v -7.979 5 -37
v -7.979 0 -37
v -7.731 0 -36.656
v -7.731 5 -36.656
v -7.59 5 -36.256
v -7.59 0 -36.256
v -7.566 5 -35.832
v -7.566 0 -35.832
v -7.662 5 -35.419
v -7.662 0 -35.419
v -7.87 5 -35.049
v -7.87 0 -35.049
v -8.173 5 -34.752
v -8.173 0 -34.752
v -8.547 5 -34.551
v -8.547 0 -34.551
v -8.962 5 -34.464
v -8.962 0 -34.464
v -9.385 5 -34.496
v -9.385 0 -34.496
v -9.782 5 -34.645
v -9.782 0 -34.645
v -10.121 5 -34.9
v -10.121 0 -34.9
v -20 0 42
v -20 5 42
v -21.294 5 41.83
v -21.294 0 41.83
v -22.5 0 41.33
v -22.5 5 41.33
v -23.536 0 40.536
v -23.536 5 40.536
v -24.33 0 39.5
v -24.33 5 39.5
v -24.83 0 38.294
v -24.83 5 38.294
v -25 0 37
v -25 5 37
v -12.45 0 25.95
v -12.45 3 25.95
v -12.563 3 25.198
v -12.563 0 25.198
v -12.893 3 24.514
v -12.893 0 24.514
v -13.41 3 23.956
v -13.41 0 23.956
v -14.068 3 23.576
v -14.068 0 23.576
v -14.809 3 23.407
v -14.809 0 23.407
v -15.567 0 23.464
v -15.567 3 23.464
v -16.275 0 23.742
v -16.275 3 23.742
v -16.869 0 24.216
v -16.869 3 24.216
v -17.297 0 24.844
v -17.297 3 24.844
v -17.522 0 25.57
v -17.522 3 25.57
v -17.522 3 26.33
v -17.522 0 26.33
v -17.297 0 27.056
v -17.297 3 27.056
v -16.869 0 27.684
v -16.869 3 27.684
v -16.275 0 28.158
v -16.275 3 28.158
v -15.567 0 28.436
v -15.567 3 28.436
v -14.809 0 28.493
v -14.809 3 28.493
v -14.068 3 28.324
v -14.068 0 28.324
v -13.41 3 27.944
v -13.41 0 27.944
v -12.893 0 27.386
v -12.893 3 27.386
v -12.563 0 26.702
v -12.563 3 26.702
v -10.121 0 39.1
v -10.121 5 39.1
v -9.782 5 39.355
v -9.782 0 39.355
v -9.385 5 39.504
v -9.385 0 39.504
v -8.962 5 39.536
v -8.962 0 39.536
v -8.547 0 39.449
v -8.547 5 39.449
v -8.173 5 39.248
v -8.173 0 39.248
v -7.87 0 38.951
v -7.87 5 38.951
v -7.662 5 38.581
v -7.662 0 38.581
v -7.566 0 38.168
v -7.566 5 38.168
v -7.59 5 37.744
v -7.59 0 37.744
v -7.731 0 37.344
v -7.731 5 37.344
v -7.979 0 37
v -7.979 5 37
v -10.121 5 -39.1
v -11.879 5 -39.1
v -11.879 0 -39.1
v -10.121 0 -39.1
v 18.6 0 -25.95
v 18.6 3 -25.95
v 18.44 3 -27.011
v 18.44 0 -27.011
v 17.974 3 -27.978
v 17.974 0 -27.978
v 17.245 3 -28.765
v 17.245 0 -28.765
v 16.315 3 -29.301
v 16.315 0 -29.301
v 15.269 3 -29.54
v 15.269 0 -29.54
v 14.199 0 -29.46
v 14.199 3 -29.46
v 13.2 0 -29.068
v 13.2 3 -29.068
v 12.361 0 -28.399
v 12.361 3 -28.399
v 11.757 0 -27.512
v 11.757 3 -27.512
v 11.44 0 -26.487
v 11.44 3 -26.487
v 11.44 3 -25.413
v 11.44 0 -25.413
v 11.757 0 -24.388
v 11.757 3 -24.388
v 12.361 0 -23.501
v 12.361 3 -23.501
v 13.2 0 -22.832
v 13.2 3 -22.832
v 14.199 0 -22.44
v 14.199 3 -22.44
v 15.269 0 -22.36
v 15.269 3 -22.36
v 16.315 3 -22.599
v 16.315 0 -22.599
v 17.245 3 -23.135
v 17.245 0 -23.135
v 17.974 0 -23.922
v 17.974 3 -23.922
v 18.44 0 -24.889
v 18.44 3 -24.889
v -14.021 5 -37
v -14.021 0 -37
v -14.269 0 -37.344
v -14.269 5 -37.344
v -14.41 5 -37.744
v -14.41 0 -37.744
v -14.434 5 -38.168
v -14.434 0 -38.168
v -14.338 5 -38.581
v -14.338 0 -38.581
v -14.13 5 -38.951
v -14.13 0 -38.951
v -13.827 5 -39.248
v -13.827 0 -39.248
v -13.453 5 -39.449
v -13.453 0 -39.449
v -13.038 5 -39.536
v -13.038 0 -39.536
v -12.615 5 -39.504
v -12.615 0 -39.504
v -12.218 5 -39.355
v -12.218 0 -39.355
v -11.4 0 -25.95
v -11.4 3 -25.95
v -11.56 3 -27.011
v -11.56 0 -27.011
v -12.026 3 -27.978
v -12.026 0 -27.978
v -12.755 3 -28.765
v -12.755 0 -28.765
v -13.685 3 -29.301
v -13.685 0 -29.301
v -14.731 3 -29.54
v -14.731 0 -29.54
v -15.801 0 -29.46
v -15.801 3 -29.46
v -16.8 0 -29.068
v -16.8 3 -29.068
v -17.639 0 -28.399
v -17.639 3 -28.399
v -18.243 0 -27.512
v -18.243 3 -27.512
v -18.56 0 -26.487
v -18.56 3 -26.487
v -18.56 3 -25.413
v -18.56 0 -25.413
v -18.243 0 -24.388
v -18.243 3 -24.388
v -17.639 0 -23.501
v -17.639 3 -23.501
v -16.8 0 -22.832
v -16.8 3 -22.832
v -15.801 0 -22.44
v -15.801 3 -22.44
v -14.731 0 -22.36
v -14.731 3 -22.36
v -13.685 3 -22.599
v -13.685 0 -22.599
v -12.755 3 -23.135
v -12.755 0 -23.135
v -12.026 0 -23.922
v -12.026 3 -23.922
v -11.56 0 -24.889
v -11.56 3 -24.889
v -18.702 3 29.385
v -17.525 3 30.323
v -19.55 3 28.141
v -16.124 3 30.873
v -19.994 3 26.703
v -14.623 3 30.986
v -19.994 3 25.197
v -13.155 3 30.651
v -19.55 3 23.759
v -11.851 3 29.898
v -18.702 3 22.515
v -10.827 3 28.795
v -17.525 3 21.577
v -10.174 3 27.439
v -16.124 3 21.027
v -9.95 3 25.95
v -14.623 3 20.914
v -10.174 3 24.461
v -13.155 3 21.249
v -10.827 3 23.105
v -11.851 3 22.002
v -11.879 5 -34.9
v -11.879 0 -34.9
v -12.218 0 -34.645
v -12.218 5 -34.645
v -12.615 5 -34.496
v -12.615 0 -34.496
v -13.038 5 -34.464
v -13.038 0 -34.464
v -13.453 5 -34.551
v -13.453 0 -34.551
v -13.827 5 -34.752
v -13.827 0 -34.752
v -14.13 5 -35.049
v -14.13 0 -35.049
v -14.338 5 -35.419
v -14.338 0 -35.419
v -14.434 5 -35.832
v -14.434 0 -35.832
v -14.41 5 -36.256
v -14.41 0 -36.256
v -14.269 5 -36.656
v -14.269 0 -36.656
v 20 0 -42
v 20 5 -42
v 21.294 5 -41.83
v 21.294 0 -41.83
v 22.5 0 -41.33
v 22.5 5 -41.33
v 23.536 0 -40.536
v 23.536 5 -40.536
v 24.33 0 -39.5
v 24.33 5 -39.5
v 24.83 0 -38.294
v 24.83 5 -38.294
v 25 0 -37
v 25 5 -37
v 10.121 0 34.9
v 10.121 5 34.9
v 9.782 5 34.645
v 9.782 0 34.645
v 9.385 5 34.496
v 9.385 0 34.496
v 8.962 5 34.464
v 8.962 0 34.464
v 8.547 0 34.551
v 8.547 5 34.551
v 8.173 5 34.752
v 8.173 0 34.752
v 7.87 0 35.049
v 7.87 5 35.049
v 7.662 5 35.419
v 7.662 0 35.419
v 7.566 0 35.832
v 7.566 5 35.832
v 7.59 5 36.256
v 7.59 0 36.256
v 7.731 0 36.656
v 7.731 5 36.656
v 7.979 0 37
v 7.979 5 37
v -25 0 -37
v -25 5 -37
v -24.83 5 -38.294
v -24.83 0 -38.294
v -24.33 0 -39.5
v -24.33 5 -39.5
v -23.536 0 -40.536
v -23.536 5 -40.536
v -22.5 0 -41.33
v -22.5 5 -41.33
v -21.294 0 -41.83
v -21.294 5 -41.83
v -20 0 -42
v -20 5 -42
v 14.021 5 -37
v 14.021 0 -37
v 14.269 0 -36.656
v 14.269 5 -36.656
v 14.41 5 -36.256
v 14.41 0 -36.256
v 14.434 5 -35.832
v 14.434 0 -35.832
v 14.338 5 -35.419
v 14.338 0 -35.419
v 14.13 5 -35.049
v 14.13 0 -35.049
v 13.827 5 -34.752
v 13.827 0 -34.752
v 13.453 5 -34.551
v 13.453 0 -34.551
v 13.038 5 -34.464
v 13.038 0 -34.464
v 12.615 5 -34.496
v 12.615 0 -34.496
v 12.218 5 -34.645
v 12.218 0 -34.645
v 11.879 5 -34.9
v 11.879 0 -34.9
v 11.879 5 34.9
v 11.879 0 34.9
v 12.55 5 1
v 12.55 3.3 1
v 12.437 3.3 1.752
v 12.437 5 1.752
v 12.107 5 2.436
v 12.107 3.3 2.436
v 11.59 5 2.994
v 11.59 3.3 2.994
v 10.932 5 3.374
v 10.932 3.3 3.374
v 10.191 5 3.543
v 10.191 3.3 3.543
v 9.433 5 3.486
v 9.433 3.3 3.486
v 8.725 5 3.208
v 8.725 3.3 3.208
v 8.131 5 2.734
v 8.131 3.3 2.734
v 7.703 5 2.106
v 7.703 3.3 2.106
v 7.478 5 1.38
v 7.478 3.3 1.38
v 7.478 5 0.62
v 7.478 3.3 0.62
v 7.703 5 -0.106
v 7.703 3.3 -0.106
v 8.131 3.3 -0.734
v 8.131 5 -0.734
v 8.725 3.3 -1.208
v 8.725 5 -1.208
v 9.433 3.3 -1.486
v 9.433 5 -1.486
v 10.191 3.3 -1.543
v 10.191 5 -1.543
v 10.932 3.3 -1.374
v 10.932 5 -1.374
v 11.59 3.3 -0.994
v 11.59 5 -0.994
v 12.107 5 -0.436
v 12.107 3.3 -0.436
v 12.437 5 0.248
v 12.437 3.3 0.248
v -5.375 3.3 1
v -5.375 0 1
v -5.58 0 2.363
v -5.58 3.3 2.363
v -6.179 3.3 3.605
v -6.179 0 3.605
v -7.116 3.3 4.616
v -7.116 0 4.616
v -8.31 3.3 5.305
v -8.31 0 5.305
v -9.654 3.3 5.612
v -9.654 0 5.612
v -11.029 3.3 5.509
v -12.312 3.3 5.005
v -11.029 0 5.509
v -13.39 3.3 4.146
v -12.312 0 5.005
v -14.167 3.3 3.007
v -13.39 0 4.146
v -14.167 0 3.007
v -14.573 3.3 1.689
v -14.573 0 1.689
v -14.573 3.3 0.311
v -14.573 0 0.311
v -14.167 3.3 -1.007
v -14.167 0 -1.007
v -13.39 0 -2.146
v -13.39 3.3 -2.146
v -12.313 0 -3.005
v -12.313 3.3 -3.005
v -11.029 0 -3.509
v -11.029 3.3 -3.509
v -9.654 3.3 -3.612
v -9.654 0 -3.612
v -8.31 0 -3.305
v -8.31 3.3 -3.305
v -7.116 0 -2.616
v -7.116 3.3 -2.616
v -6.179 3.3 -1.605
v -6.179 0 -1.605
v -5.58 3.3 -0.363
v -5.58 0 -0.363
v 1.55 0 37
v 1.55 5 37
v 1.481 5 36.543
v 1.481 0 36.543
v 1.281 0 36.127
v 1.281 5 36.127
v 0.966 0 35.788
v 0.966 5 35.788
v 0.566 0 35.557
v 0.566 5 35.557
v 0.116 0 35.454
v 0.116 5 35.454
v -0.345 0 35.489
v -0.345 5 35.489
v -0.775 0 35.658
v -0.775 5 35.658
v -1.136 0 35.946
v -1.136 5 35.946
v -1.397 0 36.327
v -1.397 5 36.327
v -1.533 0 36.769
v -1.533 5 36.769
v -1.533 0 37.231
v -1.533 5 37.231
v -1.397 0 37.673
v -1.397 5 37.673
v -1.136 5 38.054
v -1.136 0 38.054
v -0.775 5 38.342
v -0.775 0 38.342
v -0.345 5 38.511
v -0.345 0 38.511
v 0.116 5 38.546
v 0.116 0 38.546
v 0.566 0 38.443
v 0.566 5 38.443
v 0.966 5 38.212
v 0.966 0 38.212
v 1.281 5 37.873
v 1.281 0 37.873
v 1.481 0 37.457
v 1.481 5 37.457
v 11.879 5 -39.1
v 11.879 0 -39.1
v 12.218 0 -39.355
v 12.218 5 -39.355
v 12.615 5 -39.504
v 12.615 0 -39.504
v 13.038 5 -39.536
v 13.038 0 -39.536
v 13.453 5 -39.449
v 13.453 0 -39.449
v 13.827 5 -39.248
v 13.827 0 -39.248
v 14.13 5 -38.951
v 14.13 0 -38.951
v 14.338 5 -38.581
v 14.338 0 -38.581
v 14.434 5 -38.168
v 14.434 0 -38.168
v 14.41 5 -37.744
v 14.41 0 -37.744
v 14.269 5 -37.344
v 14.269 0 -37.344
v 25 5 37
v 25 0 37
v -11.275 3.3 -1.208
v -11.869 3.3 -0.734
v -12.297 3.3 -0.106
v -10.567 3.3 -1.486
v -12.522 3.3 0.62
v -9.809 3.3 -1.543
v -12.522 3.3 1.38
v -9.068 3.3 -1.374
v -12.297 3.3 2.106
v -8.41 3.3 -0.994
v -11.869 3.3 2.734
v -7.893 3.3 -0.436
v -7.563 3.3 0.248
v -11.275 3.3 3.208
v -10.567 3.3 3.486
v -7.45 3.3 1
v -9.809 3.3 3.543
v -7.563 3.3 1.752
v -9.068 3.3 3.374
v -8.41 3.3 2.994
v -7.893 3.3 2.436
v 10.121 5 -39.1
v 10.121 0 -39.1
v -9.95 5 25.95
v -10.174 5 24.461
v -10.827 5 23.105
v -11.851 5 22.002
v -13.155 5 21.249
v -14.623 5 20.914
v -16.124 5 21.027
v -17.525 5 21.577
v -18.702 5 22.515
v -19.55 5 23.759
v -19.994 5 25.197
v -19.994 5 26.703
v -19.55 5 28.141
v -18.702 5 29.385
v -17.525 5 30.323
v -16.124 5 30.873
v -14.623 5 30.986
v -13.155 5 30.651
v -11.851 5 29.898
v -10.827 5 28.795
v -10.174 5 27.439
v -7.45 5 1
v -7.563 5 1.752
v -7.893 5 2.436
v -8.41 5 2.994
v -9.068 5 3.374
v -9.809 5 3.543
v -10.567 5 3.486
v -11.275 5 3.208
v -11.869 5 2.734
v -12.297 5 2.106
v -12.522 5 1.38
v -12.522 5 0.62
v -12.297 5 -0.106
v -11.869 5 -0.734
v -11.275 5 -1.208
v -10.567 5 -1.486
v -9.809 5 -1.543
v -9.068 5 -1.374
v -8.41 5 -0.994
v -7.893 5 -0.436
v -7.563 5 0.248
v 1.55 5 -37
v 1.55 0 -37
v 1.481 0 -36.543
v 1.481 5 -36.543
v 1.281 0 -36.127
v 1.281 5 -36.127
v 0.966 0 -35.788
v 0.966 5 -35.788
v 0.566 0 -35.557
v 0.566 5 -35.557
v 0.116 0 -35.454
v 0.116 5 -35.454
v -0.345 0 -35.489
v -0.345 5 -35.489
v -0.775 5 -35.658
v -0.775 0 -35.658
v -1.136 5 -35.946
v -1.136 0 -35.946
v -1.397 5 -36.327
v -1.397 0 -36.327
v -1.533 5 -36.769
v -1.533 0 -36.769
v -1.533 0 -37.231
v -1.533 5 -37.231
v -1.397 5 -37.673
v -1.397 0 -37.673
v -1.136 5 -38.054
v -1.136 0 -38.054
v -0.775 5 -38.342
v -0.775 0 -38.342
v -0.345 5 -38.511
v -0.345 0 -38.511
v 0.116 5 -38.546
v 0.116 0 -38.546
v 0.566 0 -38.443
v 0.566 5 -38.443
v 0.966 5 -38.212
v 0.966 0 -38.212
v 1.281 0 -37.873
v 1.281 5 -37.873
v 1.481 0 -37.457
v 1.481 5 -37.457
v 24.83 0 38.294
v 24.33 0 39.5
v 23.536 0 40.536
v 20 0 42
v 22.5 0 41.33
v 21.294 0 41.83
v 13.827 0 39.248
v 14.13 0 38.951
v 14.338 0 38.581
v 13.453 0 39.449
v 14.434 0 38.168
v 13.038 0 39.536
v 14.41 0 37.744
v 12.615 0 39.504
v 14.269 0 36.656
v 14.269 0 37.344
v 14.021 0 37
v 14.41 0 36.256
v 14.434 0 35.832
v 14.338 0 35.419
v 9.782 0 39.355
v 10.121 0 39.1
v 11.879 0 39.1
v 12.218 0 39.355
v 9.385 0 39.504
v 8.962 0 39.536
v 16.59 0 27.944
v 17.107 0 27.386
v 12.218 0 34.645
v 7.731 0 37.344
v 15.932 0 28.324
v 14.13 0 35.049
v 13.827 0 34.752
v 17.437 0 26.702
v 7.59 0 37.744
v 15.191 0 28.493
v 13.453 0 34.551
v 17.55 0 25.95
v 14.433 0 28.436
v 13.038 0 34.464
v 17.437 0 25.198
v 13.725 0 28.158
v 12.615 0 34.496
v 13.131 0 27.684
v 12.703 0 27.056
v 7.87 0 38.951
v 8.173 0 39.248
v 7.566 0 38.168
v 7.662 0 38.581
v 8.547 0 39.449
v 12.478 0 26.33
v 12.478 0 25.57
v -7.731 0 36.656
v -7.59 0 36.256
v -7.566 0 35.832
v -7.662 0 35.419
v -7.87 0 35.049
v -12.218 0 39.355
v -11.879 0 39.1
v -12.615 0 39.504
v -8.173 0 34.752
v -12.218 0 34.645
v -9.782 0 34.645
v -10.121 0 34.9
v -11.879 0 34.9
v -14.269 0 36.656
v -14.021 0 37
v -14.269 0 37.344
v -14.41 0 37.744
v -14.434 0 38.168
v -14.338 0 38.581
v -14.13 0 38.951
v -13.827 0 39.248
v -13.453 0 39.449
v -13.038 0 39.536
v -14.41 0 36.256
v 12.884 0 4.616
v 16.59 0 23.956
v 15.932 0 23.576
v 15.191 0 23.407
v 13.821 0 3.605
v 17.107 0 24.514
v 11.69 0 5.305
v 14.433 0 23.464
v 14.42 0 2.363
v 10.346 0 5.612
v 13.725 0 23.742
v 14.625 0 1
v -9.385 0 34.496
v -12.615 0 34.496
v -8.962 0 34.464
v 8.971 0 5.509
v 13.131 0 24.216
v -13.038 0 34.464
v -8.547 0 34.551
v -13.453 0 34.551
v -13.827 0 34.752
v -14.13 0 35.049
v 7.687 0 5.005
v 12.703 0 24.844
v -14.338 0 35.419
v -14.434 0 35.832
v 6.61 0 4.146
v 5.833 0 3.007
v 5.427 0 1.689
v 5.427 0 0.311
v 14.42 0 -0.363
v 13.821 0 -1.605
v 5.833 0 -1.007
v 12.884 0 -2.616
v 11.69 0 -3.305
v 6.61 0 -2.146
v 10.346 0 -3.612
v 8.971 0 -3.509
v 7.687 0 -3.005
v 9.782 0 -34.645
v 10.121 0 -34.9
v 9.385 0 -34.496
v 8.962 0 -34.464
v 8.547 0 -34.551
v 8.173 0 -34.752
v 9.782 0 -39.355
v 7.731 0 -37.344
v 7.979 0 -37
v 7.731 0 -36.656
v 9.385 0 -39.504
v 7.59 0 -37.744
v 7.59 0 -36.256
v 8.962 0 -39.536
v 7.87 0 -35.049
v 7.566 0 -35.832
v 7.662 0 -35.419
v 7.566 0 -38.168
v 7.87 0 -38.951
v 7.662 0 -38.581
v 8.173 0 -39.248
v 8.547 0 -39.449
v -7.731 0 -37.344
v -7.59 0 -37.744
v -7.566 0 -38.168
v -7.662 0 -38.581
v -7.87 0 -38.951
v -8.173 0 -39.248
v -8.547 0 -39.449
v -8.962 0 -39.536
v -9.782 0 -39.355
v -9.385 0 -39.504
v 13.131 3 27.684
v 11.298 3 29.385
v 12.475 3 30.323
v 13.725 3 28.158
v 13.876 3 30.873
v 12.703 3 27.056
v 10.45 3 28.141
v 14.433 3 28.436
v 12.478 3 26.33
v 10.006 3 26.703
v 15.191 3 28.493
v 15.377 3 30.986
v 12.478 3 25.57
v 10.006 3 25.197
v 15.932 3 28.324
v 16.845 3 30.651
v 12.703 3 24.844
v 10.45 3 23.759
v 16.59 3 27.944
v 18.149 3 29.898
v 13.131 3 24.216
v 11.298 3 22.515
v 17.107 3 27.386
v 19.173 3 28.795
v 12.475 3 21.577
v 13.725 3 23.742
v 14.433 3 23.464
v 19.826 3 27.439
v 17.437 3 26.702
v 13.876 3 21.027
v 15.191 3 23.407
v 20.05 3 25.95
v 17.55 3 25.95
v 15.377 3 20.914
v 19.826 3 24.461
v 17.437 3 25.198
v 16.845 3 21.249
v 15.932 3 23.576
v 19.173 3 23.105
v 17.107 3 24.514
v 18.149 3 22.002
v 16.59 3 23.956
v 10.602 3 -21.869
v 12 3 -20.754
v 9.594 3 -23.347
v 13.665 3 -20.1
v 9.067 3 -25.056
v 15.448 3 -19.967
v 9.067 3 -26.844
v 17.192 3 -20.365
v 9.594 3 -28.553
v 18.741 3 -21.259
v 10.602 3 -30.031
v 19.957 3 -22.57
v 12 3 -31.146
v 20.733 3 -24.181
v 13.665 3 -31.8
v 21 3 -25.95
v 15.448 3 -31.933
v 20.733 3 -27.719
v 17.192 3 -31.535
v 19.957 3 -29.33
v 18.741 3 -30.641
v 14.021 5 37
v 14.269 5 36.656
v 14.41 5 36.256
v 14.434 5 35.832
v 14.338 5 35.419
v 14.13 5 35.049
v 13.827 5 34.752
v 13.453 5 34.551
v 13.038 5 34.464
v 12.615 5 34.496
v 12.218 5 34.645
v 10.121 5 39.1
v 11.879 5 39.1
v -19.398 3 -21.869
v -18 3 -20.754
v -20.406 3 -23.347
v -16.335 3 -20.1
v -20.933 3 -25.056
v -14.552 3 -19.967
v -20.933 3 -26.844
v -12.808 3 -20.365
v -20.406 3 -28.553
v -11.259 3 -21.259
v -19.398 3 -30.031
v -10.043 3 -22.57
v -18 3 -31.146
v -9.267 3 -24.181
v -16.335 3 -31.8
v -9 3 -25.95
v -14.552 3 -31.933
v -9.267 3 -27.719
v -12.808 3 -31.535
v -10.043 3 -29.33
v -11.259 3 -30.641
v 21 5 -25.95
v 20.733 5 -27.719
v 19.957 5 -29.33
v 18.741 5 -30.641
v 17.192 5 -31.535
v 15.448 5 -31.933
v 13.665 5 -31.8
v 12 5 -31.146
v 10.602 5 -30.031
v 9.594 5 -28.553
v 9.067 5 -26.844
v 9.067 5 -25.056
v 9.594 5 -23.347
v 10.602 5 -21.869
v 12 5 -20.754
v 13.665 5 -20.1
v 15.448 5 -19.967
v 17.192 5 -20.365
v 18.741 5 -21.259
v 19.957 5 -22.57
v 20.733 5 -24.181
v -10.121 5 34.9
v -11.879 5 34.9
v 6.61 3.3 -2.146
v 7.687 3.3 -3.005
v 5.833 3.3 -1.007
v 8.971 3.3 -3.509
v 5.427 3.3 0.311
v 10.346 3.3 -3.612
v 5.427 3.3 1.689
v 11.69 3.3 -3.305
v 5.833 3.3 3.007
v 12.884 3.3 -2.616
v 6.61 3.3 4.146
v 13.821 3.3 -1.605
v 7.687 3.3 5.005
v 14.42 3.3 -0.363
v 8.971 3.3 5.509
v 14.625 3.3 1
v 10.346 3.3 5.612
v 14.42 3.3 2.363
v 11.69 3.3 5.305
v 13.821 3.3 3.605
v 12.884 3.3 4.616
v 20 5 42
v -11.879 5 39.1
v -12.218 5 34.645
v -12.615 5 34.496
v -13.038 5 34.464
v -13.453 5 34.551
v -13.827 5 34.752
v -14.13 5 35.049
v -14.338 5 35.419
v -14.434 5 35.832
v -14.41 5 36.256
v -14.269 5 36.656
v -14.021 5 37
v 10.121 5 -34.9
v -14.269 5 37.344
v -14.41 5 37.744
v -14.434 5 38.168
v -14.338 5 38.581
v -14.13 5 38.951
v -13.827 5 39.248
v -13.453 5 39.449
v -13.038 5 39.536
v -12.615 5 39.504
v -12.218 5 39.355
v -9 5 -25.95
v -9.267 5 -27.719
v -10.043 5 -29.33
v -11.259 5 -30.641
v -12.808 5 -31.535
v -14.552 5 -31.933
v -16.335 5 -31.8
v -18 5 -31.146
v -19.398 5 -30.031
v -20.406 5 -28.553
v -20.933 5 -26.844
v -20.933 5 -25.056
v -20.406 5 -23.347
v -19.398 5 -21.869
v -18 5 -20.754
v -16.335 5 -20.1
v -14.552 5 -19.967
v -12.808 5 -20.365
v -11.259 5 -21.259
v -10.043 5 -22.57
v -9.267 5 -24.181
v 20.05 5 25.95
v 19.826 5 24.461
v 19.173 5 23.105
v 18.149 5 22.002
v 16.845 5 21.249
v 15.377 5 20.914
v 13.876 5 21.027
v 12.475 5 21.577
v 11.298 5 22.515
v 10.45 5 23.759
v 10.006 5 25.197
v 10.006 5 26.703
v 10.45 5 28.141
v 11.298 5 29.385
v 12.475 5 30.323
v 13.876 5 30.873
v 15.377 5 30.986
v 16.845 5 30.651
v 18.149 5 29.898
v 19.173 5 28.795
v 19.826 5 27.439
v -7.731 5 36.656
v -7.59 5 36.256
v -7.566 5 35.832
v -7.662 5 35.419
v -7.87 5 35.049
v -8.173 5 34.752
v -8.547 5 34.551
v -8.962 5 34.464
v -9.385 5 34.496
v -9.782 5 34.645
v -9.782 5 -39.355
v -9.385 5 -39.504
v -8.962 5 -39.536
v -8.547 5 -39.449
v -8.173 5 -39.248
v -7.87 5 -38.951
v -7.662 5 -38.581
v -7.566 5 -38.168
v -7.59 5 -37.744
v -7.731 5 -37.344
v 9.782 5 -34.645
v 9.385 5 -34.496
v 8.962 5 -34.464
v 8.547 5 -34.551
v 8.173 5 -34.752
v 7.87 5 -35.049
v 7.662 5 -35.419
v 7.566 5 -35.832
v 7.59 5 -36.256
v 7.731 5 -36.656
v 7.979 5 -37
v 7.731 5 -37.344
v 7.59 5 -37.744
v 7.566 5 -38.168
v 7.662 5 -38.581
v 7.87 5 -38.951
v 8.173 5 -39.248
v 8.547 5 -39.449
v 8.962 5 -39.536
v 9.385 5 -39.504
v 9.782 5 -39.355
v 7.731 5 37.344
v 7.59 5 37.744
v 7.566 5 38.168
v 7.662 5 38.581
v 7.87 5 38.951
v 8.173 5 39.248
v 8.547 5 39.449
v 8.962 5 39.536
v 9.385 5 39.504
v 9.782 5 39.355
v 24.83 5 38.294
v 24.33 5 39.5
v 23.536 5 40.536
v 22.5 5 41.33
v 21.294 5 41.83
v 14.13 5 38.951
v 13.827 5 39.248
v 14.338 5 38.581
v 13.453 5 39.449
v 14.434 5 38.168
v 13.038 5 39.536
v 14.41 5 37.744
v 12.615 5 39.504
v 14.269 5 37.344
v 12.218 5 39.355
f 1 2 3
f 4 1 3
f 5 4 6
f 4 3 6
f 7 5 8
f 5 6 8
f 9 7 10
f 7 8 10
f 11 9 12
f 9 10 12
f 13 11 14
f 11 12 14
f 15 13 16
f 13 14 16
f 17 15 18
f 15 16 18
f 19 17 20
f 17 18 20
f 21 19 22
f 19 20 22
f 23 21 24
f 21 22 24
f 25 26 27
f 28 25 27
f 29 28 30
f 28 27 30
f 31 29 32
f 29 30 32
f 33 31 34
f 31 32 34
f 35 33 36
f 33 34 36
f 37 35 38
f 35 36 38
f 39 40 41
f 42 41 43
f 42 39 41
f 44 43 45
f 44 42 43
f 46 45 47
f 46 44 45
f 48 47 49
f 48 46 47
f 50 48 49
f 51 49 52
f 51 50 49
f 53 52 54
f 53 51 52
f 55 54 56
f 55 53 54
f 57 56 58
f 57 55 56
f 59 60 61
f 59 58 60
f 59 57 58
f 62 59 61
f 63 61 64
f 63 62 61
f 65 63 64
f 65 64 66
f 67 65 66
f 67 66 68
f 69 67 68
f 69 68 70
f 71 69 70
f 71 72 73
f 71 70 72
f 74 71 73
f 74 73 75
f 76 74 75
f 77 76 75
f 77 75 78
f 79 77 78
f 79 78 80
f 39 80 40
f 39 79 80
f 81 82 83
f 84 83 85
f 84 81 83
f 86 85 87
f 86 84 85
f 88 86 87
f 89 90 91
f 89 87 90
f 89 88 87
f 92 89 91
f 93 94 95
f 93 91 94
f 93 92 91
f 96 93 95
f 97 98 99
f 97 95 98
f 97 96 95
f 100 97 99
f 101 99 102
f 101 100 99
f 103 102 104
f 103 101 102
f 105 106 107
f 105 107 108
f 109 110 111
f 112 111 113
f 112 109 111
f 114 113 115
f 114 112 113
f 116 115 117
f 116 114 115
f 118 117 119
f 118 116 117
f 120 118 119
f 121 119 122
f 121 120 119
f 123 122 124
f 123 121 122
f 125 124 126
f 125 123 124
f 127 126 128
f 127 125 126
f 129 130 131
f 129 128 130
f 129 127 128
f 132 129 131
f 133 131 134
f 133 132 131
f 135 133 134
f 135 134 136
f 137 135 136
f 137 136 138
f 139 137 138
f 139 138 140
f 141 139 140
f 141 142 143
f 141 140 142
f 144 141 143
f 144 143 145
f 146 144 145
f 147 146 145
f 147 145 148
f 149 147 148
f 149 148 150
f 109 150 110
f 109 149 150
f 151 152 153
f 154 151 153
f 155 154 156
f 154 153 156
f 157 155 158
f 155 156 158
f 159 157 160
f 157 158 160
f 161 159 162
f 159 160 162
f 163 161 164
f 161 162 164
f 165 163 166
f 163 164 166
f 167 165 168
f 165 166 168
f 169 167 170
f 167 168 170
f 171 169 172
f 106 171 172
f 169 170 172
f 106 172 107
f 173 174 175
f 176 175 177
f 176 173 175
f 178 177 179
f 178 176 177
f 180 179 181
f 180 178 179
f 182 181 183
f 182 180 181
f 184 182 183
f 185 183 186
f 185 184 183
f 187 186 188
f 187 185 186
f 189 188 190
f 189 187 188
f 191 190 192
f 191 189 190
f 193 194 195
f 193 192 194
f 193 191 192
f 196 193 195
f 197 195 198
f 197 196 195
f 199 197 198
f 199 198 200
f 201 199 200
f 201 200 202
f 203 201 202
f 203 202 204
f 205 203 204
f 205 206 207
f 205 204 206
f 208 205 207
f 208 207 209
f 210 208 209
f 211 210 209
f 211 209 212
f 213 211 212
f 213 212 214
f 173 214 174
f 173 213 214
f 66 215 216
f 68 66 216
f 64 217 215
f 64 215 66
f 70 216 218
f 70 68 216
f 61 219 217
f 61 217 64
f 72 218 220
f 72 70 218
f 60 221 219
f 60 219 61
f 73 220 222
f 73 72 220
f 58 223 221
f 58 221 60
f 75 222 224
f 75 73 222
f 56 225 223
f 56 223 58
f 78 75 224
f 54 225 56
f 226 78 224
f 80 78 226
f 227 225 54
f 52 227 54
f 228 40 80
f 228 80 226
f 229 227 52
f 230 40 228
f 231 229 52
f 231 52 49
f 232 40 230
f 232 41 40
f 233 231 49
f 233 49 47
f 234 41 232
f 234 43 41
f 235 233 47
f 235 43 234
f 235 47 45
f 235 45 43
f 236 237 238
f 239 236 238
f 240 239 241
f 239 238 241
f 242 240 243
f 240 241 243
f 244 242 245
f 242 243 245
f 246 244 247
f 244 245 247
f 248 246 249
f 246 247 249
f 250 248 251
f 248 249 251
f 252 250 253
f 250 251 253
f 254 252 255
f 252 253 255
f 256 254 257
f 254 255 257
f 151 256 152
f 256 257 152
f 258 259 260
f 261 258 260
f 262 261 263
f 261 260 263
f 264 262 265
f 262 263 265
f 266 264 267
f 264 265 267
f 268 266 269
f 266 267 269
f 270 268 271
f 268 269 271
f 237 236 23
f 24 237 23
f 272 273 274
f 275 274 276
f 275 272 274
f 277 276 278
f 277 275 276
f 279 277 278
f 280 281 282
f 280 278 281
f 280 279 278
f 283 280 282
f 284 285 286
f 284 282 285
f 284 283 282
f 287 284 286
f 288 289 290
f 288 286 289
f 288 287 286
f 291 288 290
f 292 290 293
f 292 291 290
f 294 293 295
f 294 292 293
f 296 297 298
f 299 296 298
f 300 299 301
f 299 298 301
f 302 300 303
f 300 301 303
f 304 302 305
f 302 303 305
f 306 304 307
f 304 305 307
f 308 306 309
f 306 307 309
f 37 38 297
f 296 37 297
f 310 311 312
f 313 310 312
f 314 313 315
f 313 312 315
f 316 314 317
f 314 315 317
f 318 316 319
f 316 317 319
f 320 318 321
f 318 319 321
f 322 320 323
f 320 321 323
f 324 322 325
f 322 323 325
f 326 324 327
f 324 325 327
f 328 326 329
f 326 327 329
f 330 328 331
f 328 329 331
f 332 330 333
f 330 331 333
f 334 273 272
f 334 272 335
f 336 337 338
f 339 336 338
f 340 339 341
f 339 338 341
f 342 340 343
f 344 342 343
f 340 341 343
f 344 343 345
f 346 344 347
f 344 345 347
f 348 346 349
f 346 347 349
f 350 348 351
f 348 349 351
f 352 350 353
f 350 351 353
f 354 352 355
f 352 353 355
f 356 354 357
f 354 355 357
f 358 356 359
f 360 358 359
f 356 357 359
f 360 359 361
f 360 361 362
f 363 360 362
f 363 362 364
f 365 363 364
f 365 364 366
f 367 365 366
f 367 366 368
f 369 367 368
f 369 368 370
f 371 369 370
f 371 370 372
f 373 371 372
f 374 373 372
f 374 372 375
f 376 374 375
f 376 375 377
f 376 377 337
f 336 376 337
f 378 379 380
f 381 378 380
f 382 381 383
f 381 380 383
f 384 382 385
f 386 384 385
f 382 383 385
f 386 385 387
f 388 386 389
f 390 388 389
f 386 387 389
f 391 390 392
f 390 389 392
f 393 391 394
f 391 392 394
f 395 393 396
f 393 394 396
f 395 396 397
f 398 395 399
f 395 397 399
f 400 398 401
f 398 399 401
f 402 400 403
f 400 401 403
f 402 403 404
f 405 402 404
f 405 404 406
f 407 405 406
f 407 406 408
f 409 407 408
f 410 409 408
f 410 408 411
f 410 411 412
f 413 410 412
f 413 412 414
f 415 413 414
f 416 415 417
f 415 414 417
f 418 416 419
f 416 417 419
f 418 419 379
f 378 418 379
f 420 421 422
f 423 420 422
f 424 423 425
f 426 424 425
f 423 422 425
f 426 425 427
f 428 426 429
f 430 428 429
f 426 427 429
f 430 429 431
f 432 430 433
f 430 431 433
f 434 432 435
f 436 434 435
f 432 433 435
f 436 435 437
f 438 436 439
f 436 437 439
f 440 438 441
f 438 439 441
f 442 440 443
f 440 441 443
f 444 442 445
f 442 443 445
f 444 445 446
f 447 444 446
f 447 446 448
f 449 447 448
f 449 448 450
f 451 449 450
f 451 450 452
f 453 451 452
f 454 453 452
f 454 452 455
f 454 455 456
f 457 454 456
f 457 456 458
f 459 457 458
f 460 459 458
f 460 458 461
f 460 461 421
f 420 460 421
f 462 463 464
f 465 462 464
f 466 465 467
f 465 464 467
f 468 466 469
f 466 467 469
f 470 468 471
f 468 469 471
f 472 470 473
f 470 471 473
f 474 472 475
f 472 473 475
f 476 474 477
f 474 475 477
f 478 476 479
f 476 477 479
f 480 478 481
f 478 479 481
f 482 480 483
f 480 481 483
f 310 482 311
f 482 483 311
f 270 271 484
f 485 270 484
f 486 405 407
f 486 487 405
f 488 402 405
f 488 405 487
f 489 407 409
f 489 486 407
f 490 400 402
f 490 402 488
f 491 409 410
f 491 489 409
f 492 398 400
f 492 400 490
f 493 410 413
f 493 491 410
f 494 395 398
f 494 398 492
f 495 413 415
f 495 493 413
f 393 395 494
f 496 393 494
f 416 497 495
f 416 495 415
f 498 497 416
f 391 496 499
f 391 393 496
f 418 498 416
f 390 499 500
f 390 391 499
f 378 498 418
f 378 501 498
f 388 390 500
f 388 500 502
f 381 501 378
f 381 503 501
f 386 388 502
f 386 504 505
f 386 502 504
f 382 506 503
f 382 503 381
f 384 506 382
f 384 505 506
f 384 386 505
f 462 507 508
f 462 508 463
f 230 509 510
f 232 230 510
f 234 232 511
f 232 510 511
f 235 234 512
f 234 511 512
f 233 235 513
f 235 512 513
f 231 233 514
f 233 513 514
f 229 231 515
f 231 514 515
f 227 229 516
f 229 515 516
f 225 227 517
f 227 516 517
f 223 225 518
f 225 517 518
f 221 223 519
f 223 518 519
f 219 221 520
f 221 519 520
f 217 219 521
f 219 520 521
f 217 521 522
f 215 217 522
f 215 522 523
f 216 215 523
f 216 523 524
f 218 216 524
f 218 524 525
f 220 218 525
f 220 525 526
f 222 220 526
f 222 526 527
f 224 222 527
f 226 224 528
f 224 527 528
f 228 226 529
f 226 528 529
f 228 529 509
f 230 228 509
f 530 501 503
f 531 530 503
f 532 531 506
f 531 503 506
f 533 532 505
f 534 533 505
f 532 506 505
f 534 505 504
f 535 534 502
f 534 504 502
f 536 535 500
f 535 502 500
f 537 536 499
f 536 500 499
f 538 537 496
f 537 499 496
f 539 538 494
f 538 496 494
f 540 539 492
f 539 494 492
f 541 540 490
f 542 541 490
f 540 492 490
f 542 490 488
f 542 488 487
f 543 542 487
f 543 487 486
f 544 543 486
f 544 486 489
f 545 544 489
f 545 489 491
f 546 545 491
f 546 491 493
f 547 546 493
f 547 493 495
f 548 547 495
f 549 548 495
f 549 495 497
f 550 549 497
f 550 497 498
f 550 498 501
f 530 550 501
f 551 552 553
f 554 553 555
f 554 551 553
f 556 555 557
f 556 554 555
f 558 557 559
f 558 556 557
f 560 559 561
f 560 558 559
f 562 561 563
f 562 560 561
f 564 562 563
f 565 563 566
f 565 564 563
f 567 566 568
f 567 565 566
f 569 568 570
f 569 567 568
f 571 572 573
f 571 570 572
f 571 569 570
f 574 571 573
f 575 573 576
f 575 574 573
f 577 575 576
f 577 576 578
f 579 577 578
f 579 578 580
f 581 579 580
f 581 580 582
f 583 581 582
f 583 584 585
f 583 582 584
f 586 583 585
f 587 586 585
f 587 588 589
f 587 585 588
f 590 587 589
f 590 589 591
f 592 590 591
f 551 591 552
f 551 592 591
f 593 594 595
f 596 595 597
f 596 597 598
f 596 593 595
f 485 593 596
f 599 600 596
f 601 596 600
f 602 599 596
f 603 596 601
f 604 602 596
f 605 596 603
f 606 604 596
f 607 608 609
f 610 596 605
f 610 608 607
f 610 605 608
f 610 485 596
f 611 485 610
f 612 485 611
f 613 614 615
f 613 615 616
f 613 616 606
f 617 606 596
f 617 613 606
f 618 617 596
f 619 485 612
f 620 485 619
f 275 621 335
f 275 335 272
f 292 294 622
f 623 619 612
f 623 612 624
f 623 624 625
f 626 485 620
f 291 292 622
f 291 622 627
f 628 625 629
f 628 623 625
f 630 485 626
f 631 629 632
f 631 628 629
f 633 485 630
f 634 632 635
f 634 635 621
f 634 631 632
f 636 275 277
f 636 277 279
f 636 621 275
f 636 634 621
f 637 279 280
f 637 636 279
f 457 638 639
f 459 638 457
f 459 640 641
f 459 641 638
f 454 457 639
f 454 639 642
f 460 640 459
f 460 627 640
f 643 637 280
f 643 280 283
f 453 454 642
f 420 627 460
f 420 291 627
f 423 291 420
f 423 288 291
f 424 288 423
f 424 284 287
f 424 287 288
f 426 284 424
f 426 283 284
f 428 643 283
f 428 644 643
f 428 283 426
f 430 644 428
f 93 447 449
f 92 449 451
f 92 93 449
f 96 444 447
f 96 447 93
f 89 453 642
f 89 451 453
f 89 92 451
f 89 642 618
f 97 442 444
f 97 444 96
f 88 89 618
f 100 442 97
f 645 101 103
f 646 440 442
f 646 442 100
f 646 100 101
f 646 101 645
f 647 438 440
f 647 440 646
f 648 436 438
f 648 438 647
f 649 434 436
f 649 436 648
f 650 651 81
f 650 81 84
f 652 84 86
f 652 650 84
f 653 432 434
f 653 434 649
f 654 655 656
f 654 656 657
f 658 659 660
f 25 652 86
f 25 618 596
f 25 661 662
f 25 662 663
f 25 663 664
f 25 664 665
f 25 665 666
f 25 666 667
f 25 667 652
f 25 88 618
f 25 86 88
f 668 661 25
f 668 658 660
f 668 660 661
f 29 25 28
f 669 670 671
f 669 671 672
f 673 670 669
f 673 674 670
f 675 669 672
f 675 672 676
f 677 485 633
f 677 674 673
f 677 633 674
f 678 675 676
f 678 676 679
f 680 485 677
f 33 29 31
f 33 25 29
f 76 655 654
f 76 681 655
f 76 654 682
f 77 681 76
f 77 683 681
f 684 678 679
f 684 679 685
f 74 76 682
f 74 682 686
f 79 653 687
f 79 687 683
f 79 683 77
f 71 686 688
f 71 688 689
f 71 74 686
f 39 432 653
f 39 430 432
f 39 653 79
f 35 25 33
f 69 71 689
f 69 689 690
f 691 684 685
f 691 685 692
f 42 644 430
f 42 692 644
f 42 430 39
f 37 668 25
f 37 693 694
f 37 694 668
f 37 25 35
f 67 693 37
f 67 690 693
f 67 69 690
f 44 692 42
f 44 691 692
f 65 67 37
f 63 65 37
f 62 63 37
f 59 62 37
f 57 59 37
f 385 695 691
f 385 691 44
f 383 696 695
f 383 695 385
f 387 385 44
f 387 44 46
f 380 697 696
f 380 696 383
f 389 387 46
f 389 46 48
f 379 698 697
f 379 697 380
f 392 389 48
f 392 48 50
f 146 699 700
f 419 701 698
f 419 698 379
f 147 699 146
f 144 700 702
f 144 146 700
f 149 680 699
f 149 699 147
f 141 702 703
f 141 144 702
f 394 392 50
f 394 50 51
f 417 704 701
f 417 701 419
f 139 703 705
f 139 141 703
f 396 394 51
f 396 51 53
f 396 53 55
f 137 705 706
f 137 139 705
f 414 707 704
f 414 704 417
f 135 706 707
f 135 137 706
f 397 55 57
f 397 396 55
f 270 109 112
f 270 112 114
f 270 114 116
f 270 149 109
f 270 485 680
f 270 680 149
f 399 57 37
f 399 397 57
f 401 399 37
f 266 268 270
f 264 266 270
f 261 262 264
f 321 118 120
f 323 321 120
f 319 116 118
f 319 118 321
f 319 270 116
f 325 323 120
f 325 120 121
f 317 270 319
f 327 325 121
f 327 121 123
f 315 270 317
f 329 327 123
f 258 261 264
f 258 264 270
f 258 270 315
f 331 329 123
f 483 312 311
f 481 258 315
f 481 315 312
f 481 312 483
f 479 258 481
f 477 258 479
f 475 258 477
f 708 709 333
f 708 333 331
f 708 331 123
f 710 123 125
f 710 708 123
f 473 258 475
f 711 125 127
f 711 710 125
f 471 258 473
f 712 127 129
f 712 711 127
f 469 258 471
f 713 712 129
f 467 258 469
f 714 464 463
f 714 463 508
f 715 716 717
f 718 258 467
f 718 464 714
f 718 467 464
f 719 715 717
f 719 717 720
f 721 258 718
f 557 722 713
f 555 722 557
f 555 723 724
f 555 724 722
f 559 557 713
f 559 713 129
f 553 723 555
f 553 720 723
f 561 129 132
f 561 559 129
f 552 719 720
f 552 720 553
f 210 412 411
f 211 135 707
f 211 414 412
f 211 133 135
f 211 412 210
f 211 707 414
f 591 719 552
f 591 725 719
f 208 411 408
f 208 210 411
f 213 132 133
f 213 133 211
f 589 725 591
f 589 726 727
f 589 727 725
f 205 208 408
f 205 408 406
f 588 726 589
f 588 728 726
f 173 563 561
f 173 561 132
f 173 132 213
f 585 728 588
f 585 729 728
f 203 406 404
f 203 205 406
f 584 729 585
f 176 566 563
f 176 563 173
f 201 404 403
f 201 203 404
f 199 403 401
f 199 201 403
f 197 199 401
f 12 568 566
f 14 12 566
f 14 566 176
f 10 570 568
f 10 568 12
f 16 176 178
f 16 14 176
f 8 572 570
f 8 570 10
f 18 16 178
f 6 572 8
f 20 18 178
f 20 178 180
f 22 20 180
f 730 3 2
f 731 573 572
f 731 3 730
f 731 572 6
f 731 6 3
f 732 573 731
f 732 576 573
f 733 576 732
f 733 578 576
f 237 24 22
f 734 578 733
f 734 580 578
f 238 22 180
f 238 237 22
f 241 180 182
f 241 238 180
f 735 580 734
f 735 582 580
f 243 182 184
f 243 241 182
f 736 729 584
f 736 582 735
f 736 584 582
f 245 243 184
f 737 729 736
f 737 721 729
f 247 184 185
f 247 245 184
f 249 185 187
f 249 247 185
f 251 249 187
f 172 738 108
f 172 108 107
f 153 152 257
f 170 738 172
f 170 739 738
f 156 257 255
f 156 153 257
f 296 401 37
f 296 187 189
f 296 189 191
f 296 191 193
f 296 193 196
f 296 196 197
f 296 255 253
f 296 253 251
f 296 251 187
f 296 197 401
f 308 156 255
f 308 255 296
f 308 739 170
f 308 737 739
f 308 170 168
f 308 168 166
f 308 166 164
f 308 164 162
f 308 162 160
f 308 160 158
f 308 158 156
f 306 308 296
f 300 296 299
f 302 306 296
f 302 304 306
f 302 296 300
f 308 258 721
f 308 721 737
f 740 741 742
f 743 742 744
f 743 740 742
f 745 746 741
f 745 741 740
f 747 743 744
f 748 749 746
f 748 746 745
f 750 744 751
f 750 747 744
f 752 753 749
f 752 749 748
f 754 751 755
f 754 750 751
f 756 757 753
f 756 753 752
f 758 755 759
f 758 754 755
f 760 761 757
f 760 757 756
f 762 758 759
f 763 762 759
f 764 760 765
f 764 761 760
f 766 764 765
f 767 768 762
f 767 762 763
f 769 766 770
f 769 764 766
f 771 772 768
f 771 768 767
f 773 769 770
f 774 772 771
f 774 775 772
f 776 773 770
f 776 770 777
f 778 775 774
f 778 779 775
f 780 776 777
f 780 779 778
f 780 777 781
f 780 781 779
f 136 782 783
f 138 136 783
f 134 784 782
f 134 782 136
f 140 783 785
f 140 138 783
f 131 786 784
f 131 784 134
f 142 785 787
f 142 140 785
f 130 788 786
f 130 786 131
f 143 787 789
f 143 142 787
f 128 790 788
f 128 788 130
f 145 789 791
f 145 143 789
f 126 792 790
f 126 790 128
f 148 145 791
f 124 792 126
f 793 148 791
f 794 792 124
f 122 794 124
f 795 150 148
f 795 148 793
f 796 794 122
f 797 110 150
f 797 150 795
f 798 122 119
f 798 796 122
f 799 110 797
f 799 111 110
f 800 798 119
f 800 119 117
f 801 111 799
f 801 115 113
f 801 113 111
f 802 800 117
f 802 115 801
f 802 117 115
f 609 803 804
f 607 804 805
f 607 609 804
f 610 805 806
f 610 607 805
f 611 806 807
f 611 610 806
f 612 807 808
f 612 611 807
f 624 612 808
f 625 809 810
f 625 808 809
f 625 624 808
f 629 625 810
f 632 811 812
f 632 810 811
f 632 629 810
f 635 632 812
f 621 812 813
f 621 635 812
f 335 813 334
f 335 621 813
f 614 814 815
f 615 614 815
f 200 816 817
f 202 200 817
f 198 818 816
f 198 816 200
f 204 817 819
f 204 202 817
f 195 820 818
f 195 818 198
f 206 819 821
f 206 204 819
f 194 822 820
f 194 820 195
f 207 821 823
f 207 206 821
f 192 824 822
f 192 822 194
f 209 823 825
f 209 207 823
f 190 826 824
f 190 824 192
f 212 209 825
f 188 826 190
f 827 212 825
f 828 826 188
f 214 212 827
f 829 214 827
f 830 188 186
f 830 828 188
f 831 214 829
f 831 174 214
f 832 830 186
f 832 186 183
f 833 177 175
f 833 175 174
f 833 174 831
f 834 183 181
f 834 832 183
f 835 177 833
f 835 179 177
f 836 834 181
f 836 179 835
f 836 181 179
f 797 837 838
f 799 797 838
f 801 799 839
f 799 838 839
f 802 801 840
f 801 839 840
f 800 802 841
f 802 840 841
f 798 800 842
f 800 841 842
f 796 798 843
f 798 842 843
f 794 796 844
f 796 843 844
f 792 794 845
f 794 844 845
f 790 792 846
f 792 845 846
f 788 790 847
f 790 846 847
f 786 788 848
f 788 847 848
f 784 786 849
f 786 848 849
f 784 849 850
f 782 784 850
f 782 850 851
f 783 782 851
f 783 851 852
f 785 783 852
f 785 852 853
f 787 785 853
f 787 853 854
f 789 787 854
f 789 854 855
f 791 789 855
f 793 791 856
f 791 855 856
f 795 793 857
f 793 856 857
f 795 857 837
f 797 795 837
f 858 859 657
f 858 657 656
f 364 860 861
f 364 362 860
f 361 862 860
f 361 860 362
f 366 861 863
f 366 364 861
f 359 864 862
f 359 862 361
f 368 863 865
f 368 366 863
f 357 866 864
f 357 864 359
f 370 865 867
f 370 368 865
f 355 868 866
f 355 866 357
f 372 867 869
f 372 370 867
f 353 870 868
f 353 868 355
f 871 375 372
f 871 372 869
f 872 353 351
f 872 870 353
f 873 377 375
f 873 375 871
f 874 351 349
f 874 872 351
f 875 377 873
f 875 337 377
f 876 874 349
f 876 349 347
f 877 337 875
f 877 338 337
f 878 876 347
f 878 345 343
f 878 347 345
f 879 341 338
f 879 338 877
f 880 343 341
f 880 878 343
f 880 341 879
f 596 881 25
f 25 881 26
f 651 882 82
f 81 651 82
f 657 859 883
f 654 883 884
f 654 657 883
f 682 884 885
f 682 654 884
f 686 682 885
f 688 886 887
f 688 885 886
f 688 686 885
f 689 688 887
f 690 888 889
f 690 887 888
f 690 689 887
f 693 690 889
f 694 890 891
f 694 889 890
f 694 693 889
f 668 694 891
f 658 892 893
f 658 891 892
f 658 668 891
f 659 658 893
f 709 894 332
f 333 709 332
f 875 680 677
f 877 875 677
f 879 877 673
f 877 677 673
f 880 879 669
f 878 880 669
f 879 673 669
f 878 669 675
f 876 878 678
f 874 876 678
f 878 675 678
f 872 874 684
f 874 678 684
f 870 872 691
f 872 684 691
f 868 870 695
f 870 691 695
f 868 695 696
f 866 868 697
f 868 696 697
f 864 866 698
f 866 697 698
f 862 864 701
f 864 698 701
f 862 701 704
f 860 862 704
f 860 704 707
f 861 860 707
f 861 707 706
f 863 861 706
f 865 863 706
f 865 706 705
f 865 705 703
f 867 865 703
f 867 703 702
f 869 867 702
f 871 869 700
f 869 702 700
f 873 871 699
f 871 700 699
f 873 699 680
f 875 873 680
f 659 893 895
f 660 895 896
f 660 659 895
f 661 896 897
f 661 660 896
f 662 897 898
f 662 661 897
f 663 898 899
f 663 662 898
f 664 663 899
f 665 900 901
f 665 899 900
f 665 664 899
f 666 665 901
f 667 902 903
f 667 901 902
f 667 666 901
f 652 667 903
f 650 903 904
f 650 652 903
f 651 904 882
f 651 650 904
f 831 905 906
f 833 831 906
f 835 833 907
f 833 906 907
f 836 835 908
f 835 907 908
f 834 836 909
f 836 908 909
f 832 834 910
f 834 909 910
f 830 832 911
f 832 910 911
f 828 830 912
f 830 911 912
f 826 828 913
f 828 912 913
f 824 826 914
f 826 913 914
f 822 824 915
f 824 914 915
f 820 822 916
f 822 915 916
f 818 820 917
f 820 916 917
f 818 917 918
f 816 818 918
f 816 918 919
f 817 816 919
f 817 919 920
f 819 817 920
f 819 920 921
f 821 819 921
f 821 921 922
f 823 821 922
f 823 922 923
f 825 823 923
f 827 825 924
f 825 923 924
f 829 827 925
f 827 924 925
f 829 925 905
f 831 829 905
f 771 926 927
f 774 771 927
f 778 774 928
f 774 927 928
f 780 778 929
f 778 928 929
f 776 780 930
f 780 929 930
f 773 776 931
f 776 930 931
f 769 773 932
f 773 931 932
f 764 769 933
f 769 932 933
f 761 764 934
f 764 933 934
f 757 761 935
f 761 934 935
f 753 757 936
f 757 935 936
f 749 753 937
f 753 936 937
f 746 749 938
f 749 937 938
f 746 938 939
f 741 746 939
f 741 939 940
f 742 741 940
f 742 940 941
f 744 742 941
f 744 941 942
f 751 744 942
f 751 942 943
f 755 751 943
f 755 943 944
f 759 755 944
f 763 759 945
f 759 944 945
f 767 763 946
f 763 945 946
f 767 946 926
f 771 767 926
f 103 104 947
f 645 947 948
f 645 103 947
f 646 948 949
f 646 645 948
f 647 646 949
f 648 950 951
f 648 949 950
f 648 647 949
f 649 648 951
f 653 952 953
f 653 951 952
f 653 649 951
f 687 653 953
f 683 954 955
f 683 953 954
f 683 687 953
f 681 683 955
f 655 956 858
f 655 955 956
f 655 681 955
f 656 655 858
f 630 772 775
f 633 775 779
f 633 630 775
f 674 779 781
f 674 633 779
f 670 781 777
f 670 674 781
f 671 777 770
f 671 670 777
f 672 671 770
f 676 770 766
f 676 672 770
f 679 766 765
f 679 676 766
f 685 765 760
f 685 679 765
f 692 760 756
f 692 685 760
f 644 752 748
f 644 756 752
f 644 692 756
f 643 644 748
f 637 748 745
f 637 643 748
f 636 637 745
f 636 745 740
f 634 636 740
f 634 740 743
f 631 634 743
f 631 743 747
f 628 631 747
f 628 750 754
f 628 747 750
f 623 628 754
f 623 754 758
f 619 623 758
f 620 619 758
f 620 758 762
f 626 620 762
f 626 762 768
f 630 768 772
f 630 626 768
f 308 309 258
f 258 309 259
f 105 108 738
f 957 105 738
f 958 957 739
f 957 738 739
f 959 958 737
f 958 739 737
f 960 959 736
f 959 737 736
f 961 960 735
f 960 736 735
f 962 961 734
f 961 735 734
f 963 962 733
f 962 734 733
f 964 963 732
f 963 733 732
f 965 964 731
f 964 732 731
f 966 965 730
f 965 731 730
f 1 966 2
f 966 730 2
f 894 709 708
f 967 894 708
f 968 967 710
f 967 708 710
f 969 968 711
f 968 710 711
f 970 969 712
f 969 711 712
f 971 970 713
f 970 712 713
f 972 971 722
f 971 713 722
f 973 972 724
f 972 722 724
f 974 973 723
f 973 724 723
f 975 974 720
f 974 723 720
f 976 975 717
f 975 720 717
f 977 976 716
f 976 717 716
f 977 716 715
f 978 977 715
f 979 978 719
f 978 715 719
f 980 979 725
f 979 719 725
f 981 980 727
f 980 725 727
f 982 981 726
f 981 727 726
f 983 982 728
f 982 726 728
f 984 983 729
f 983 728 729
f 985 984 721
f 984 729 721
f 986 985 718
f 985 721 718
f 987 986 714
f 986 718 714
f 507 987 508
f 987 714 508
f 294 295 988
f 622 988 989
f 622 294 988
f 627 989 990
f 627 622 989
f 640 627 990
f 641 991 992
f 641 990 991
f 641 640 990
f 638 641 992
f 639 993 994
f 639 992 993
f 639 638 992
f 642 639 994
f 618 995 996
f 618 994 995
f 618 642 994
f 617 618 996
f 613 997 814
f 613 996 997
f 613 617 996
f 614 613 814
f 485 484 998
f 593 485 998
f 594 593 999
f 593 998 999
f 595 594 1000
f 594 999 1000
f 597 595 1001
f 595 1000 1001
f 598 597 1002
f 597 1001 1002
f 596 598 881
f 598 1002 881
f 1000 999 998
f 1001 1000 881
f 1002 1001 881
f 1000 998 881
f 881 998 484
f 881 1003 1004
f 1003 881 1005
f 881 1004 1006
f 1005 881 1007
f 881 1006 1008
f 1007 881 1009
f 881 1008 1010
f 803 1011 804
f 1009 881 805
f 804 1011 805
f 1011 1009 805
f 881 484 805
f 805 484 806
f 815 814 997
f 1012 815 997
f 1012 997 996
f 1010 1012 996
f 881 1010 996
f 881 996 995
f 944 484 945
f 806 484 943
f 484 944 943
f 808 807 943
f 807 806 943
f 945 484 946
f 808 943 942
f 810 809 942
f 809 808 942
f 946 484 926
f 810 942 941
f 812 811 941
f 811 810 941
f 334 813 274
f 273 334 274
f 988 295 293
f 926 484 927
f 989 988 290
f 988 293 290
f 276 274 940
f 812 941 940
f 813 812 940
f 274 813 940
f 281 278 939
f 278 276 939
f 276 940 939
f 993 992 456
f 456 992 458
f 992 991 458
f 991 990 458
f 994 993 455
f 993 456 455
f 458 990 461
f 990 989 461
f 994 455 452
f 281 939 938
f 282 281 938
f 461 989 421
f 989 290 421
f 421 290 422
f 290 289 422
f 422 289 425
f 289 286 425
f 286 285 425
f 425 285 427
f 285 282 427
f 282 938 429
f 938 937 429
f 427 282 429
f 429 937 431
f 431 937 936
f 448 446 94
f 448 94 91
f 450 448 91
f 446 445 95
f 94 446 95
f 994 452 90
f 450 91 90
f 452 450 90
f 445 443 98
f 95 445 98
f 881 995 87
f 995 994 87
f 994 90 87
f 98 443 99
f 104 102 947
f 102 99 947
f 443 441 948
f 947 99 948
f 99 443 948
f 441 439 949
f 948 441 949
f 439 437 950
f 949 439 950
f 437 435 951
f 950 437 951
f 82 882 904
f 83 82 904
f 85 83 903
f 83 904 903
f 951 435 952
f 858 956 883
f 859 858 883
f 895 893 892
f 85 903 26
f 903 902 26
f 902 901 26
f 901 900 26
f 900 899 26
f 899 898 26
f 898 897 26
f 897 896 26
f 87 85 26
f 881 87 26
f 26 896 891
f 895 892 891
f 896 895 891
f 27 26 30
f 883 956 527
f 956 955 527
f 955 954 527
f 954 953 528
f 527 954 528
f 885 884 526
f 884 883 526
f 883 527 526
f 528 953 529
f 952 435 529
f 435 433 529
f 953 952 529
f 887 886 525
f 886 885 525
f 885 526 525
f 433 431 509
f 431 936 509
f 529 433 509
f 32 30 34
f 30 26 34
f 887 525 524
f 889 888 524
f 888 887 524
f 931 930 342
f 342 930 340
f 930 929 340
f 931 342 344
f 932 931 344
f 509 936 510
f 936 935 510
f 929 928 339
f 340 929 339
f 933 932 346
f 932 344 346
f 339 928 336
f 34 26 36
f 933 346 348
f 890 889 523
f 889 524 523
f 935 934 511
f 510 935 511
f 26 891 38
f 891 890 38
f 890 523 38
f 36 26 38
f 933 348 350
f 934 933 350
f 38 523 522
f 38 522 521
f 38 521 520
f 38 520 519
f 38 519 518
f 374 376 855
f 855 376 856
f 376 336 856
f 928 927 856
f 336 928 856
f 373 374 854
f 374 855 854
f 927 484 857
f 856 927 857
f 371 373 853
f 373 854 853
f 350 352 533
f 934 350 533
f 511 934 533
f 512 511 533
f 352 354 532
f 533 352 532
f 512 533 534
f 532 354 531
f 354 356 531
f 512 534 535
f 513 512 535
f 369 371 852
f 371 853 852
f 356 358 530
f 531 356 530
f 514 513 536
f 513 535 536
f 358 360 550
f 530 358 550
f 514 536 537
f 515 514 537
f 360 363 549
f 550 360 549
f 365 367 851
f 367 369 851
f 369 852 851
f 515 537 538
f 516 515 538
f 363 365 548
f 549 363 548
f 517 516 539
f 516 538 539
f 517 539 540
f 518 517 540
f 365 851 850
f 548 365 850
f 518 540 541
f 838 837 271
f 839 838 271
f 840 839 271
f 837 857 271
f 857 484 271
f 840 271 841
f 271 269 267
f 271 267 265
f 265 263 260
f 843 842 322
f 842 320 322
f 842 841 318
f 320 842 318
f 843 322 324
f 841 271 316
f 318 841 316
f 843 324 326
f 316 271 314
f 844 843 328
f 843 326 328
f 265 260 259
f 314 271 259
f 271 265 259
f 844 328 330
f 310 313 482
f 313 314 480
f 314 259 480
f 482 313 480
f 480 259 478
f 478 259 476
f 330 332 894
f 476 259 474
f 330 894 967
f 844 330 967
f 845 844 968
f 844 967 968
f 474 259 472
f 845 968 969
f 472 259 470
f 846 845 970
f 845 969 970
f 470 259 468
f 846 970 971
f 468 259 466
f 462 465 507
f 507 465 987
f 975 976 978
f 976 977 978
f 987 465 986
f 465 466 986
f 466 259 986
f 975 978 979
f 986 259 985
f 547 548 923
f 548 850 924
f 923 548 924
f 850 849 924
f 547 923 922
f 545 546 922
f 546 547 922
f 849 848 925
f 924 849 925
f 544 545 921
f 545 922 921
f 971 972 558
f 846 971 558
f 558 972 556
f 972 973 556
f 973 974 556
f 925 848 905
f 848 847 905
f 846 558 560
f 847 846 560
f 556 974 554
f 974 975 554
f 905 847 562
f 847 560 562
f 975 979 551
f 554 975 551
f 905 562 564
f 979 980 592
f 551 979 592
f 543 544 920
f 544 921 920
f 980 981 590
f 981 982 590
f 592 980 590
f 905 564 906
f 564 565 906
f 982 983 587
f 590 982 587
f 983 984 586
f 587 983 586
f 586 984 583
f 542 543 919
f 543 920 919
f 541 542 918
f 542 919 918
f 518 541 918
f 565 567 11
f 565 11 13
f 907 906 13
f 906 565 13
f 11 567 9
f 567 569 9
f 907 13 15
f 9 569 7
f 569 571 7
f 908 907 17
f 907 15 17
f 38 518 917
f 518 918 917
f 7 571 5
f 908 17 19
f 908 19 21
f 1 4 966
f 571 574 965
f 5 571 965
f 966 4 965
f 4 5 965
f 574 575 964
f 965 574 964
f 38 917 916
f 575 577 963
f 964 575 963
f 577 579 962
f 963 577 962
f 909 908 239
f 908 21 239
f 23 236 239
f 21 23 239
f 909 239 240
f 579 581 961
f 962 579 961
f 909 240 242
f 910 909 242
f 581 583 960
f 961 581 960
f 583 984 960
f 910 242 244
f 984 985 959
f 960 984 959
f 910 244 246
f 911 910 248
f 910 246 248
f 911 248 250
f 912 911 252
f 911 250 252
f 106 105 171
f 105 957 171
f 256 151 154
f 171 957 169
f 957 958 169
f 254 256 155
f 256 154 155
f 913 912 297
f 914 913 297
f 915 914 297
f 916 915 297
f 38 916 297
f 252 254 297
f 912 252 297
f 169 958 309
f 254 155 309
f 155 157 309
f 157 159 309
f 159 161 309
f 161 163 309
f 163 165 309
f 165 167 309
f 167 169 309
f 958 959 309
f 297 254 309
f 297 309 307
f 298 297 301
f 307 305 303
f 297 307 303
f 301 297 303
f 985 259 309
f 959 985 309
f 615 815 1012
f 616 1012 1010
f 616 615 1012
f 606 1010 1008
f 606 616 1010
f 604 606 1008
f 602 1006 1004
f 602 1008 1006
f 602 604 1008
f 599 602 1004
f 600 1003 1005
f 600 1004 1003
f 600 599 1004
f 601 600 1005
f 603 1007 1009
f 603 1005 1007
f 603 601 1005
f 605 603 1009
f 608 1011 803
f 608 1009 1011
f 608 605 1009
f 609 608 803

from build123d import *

# Parameters (mm, degrees)
SKETCH1_R               = 3.6
SKETCH1_R_2             = 2.55
BOSS_EXTRUDE1_DEPTH     = 5
SKETCH2_R               = 6
SKETCH2_R_2             = 5.05
CUT_EXTRUDE1_DEPTH      = 2
SALIENTE_EXTRUIR1_DEPTH = 5
CROQUIS5_R              = 2.55
CORTAR_EXTRUIR2_DEPTH   = 6
CROQUIS6_R              = 1.55
CROQUIS6_W              = 6
CROQUIS6_H              = 4.2
CORTAR_EXTRUIR3_DEPTH   = 6
CORTAR_EXTRUIR4_DEPTH   = 6
CROQUIS8_R              = 4.625
CORTAR_EXTRUIR5_DEPTH   = 3.3


with BuildPart() as part:
    # Sketch1 → Boss-Extrude1 (new body)
    with BuildSketch(Plane(origin=(0, 0, 0), x_dir=(1, 0, 0), z_dir=(0, 1, 0))):
        with BuildLine():
            Line((20.365, -35), (-20.365, -35))
            ThreePointArc((-20.365, -35), (-23.642439931, -33.642439931), (-25, -30.365))
            Line((-25, -30.365), (-25, 30.365))
            ThreePointArc((-25, 30.365), (-23.642439931, 33.642439931), (-20.365, 35))
            Line((-20.365, 35), (20.365, 35))
            ThreePointArc((20.365, 35), (23.642439931, 33.642439931), (25, 30.365))
            Line((25, 30.365), (25, -30.365))
            ThreePointArc((25, -30.365), (23.642439931, -33.642439931), (20.365, -35))
        make_face()
        with Locations((-15, 25.95)):
            Circle(SKETCH1_R, mode=Mode.SUBTRACT)
        with Locations((15, 25.95)):
            Circle(SKETCH1_R, mode=Mode.SUBTRACT)
        with Locations((15, -25.95)):
            Circle(SKETCH1_R_2, mode=Mode.SUBTRACT)
        with Locations((-15, -25.95)):
            Circle(SKETCH1_R_2, mode=Mode.SUBTRACT)
    extrude(amount=BOSS_EXTRUDE1_DEPTH)

    # Sketch2 → Cut-Extrude1 (cut)
    with BuildSketch(Plane(origin=(0, 5, 0), x_dir=(1, 0, 0), z_dir=(0, 1, 0))):
        with Locations((-15, 25.95)):
            Circle(SKETCH2_R)
        with Locations((15, 25.95)):
            Circle(SKETCH2_R)
        with Locations((15, -25.95)):
            Circle(SKETCH2_R_2)
        with Locations((-15, -25.95)):
            Circle(SKETCH2_R_2)
    extrude(amount=-CUT_EXTRUDE1_DEPTH, mode=Mode.SUBTRACT)

    # Croquis3 → Saliente-Extruir1 (add)
    with BuildSketch(Plane(origin=(0, 5, 0), x_dir=(1, 0, 0), z_dir=(0, 1, 0))):
        with BuildLine():
            Line((-25, 30.365), (-25, 37))
            ThreePointArc((-25, 37), (-23.535533906, 40.535533906), (-20, 42))
            Line((-20, 42), (20, 42))
            ThreePointArc((20, 42), (23.535533906, 40.535533906), (25, 37))
            Line((25, 37), (25, 30.365))
            ThreePointArc((25, 30.365), (23.642439931, 33.642439931), (20.365, 35))
            Line((20.365, 35), (-20.365, 35))
            ThreePointArc((-20.365, 35), (-23.642439931, 33.642439931), (-25, 30.365))
        make_face()
        with BuildLine():
            Line((-20.365, -35), (20.365, -35))
            ThreePointArc((20.365, -35), (23.642439931, -33.642439931), (25, -30.365))
            Line((25, -30.365), (25, -37))
            ThreePointArc((25, -37), (23.535533906, -40.535533906), (20, -42))
            Line((20, -42), (-20, -42))
            ThreePointArc((-20, -42), (-23.535533906, -40.535533906), (-25, -37))
            Line((-25, -37), (-25, -30.365))
            ThreePointArc((-25, -30.365), (-23.642439931, -33.642439931), (-20.365, -35))
        make_face()
    extrude(amount=-SALIENTE_EXTRUIR1_DEPTH)

    # Croquis5 → Cortar-Extruir2 (cut, through all)
    with BuildSketch(Plane.XZ):
        with Locations((10, 1)):
            Circle(CROQUIS5_R)
        with Locations((-10, 1)):
            Circle(CROQUIS5_R)
    extrude(amount=-CORTAR_EXTRUIR2_DEPTH, mode=Mode.SUBTRACT)

    # Croquis6 → Cortar-Extruir3 (cut, through all)
    with BuildSketch(Plane(origin=(0, 5, 0), x_dir=(1, 0, 0), z_dir=(0, 1, 0))):
        with Locations((0, -37)):
            Circle(CROQUIS6_R)
        with Locations((-11, -37)):
            Rectangle(CROQUIS6_W, CROQUIS6_H)
        with Locations((11, -37)):
            Rectangle(CROQUIS6_W, CROQUIS6_H)
    cortar_extruir3 = extrude(amount=-CORTAR_EXTRUIR3_DEPTH, mode=Mode.SUBTRACT)

    # Croquis7 → Cortar-Extruir4 (cut, through all)
    with BuildSketch(Plane.XZ):
        with BuildLine():
            Line((-11.878679656, 39.1), (-10.121320344, 39.1))
            ThreePointArc((-10.121320344, 39.1), (-8.010608171, 39.110503119), (-7.979099854, 37))
            ThreePointArc((-7.979099854, 37), (-8.010608171, 34.889496881), (-10.121320344, 34.9))
            Line((-10.121320344, 34.9), (-11.878679656, 34.9))
            ThreePointArc((-11.878679656, 34.9), (-13.989391829, 34.889496881), (-14.020900146, 37))
            ThreePointArc((-14.020900146, 37), (-13.989391829, 39.110503119), (-11.878679656, 39.1))
        make_face()
        with BuildLine():
            Line((11.878679656, 34.9), (10.121320344, 34.9))
            ThreePointArc((10.121320344, 34.9), (8.010608171, 34.889496881), (7.979099854, 37))
            ThreePointArc((7.979099854, 37), (8.010608171, 39.110503119), (10.121320344, 39.1))
            Line((10.121320344, 39.1), (11.878679656, 39.1))
            ThreePointArc((11.878679656, 39.1), (13.989391829, 39.110503119), (14.020900146, 37))
            ThreePointArc((14.020900146, 37), (13.989391829, 34.889496881), (11.878679656, 34.9))
        make_face()
    cortar_extruir4 = extrude(amount=-CORTAR_EXTRUIR4_DEPTH, mode=Mode.SUBTRACT)

    # Croquis8 → Cortar-Extruir5 (cut)
    with BuildSketch(Plane.XZ):
        with Locations((-10, 1)):
            Circle(CROQUIS8_R)
        with Locations((10, 1)):
            Circle(CROQUIS8_R)
    extrude(amount=-CORTAR_EXTRUIR5_DEPTH, mode=Mode.SUBTRACT)

    # Simetría1: Cortar-Extruir3, Cortar-Extruir4 across plane
    add(cortar_extruir3.mirror(Plane.XY), mode=Mode.SUBTRACT)
    add(cortar_extruir4.mirror(Plane.XY), mode=Mode.SUBTRACT)


solid = part.part
